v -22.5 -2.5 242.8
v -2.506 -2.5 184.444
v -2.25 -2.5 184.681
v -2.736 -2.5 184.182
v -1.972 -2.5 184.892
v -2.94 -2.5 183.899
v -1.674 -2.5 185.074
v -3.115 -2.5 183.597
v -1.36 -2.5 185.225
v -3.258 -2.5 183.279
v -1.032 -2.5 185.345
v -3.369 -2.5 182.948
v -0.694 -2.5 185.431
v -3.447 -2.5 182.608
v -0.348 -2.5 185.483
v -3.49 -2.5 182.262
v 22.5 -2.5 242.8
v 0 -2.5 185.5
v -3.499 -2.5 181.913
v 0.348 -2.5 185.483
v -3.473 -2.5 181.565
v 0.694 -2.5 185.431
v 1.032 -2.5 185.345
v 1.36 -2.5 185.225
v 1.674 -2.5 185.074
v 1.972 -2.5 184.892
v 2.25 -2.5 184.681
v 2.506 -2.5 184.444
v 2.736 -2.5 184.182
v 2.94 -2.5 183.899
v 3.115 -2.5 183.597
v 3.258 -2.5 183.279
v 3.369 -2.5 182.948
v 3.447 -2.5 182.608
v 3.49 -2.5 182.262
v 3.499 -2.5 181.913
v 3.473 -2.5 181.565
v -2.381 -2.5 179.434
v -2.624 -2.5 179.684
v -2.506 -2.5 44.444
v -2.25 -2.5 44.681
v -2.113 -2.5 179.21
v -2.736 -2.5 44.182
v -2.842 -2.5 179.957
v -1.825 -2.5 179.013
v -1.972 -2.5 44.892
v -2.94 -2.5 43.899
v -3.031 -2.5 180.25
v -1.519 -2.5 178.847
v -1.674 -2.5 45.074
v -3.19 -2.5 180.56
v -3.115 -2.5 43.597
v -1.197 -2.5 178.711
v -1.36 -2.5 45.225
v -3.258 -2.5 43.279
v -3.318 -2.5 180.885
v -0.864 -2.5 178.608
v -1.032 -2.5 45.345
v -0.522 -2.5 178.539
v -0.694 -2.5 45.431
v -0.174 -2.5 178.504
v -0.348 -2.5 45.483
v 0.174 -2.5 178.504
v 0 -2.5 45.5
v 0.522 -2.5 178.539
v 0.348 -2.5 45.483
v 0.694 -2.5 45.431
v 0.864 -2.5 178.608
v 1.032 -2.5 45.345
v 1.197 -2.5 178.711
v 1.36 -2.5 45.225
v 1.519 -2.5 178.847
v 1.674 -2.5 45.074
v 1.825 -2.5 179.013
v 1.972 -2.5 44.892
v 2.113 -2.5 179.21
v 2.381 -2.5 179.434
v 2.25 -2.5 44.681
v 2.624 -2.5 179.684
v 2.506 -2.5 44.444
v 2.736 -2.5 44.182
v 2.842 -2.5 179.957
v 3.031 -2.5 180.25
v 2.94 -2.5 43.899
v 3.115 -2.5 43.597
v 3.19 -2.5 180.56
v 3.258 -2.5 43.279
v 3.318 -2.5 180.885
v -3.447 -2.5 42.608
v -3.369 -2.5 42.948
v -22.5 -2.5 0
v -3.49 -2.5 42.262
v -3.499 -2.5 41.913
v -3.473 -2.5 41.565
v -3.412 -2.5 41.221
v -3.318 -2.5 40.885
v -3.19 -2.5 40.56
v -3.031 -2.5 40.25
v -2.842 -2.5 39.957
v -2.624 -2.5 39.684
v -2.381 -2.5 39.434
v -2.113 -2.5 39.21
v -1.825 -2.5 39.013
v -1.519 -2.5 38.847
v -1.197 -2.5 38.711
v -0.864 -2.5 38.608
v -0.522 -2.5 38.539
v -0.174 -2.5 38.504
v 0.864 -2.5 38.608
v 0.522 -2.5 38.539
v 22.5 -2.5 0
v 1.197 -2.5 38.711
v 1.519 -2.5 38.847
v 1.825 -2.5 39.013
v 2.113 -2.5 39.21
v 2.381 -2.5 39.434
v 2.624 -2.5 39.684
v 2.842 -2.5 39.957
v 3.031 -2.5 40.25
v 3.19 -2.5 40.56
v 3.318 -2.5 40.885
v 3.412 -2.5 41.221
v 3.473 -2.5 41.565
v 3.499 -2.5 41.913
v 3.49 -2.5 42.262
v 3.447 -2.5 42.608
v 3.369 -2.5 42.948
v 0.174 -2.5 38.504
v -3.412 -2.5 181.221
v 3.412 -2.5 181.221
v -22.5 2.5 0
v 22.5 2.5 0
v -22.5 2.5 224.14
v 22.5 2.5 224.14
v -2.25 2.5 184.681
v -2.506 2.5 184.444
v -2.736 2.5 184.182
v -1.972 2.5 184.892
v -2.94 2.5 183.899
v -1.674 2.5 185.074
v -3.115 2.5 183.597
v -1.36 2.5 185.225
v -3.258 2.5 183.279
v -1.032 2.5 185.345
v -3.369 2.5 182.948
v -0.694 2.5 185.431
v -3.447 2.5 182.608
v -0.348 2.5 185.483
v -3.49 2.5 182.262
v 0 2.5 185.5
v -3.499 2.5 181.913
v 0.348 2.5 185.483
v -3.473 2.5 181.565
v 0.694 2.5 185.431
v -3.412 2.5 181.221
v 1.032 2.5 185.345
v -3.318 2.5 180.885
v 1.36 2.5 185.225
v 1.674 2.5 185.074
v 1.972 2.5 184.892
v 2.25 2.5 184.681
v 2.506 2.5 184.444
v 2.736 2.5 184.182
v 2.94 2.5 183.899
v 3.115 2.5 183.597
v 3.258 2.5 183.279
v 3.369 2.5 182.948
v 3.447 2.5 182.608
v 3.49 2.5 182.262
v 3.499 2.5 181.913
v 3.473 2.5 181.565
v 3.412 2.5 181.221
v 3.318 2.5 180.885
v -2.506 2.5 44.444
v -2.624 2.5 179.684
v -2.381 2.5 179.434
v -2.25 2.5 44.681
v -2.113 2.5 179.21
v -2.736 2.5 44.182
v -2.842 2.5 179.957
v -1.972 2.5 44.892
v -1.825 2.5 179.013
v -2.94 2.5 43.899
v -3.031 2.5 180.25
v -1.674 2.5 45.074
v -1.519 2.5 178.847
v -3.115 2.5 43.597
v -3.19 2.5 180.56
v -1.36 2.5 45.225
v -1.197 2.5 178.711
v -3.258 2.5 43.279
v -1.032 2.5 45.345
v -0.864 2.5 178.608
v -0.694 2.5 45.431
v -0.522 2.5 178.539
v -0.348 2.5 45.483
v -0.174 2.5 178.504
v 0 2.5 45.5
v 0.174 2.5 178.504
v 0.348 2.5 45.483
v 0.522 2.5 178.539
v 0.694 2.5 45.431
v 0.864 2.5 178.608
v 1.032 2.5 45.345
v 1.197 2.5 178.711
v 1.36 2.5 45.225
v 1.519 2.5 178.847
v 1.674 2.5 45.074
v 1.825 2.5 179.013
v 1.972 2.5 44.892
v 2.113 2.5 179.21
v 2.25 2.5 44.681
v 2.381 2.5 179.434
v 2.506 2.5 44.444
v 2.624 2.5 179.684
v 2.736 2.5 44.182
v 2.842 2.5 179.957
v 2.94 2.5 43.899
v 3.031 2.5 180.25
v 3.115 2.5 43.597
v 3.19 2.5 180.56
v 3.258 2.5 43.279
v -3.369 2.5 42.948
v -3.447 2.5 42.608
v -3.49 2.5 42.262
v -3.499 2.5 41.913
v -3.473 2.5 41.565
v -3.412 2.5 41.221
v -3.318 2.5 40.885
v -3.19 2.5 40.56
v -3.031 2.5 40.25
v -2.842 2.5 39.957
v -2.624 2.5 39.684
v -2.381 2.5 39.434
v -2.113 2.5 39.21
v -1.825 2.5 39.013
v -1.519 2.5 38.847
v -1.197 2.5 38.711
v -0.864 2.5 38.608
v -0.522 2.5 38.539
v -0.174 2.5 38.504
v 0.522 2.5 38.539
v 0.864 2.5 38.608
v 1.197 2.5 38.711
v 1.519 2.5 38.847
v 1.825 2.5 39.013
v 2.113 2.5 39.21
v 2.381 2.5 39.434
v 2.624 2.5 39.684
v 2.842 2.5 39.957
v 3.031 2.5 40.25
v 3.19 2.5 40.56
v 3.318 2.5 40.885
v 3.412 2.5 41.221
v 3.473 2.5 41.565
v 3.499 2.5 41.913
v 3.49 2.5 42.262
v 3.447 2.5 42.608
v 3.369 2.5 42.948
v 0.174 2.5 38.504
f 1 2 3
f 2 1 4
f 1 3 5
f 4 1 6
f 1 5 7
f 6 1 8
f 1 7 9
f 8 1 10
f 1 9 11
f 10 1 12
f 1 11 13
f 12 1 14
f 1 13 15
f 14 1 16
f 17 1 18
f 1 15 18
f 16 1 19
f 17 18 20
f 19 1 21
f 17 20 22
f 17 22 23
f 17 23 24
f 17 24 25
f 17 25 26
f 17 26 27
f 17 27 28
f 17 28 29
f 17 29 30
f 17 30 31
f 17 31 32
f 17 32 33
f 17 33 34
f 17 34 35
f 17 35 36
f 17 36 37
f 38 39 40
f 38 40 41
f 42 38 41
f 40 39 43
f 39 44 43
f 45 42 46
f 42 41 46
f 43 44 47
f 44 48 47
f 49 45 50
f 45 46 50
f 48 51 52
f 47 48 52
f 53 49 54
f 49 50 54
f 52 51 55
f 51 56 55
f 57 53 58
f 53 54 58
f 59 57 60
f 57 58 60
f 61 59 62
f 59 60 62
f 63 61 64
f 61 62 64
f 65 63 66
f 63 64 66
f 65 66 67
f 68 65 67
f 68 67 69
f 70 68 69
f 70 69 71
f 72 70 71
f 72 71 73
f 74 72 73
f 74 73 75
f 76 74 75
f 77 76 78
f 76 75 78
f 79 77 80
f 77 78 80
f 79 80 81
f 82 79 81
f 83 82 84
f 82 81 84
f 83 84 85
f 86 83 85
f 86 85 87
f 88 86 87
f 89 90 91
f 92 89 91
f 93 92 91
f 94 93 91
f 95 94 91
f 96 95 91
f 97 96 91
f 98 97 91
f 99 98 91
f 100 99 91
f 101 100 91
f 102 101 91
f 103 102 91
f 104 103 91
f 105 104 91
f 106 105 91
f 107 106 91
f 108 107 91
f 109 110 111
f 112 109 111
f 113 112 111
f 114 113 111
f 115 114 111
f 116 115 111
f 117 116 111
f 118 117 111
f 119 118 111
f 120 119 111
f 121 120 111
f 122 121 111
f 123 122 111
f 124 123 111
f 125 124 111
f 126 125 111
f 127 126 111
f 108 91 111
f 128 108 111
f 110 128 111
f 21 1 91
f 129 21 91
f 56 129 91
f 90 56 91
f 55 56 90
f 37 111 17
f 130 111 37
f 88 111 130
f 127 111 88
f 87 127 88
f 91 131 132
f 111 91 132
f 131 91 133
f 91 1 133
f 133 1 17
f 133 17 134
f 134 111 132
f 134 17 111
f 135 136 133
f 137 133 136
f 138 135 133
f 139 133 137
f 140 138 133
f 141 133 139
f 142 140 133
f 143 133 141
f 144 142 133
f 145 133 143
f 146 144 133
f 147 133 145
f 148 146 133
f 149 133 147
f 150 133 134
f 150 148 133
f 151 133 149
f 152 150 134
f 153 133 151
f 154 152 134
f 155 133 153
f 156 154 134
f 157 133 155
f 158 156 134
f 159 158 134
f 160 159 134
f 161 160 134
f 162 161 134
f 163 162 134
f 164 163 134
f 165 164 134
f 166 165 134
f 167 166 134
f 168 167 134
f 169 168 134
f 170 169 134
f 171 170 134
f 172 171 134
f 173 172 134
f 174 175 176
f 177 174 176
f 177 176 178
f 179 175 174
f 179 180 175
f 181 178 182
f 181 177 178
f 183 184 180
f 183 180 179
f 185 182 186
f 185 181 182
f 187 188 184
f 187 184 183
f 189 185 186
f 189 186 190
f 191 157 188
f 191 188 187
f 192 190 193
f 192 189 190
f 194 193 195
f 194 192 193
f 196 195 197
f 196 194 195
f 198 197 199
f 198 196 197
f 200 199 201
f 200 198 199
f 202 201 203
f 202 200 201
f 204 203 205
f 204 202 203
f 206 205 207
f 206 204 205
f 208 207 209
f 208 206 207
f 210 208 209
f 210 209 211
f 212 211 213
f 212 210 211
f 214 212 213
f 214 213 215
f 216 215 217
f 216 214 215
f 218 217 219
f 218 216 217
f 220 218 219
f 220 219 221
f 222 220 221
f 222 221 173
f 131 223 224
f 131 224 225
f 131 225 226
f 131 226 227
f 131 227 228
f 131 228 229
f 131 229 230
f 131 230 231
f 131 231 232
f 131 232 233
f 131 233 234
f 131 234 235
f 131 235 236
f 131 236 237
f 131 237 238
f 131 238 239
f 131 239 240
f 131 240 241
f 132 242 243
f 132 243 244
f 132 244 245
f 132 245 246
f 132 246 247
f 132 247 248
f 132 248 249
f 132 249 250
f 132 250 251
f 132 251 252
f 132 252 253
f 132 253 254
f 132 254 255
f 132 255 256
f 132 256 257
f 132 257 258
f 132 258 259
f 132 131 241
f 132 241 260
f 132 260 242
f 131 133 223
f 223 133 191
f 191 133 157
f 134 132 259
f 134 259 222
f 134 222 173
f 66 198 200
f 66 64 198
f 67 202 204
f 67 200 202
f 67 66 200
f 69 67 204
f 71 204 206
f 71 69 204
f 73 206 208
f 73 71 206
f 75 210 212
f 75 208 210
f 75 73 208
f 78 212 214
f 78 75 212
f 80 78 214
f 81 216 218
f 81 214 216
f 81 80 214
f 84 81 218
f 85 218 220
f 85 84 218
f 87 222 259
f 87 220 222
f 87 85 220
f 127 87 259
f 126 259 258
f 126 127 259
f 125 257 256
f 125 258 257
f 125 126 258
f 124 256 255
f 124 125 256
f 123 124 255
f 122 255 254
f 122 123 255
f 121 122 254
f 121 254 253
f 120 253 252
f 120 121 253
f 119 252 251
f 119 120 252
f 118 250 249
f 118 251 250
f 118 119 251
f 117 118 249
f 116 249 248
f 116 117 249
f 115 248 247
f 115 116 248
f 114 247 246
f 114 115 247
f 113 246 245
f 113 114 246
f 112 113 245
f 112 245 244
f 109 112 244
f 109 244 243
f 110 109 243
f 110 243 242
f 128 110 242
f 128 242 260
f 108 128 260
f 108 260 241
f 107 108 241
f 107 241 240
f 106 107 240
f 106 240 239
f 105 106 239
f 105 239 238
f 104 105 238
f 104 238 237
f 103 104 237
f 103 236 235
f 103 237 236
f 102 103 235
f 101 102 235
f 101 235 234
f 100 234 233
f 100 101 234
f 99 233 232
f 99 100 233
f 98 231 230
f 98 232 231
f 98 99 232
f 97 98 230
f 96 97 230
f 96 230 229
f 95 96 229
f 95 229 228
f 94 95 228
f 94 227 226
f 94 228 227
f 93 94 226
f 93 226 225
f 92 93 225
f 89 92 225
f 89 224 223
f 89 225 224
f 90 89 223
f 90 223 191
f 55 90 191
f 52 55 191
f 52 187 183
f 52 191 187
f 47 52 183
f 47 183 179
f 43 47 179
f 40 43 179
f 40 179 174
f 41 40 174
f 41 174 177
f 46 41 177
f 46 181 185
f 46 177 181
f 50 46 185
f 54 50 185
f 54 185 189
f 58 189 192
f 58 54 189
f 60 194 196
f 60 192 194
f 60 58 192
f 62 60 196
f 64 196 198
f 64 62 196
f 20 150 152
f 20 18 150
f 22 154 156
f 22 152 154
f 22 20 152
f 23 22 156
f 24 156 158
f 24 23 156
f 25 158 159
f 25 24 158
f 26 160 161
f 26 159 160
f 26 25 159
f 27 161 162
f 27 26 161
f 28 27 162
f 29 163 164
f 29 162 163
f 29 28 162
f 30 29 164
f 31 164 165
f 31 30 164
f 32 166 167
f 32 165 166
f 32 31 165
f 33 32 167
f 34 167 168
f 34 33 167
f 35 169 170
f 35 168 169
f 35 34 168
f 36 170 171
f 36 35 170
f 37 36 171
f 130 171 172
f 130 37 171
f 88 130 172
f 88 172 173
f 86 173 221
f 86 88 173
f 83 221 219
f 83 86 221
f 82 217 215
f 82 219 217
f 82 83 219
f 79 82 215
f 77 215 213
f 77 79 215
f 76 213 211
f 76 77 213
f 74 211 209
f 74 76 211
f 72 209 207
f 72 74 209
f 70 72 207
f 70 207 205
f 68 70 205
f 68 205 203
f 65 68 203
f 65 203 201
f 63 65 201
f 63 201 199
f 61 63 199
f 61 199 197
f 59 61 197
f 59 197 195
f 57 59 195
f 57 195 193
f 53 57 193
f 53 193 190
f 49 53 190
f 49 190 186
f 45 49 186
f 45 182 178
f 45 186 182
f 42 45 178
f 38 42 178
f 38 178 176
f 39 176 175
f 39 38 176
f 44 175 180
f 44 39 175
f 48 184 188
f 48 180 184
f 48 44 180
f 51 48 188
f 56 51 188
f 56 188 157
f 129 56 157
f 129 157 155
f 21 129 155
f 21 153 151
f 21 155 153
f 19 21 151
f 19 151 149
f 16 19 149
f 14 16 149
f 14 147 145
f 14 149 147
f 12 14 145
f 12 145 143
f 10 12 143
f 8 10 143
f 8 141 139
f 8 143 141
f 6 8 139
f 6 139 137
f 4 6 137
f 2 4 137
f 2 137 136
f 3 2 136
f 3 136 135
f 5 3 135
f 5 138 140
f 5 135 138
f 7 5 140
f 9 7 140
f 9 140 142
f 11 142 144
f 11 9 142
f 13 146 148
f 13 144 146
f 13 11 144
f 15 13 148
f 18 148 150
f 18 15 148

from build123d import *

# Parameters (mm, degrees)
SKETCH_1_W               = 45
SKETCH_1_H               = 5
EXTRUDE_1_DEPTH          = 242.8
CUT_EXTRUDE_2_DEPTH      = 244.891553769
CUT_EXTRUDE_2_DEPTH_BACK = 244.891553769
SKETCH_3_R               = 3.5
CUT_EXTRUDE_3_DEPTH      = 247.947545037
CUT_EXTRUDE_3_DEPTH_BACK = 247.947545037


with BuildPart() as part:
    # Эскиз1 → Бобышка-Вытянуть1 (new body)
    with BuildSketch(Plane.XY):
        Rectangle(SKETCH_1_W, SKETCH_1_H)
    extrude(amount=EXTRUDE_1_DEPTH)

    # Эскиз3 → Вырез-Вытянуть2 (cut, two sides: drawn at the far end of the back side and taken through both)
    with BuildSketch(Plane(origin=(0, 2.5, 0), x_dir=(1, 0, 0), z_dir=(0, 1, 0)).offset(-CUT_EXTRUDE_2_DEPTH_BACK)):
        with Locations(Location((0, -42, 0), (0, 0, 270))):
            Circle(SKETCH_3_R)
        with Locations(Location((0, -182, 0), (0, 0, 270))):
            Circle(SKETCH_3_R)
        with Locations((0, -322)):
            Circle(SKETCH_3_R)
        with Locations((0, -462)):
            Circle(SKETCH_3_R)
        with Locations((0, -602)):
            Circle(SKETCH_3_R)
        with Locations((0, -742)):
            Circle(SKETCH_3_R)
        with Locations((0, -882)):
            Circle(SKETCH_3_R)
        with Locations((0, -1022)):
            Circle(SKETCH_3_R)
        with Locations((0, -1162)):
            Circle(SKETCH_3_R)
        with Locations((0, -1302)):
            Circle(SKETCH_3_R)
    extrude(amount=CUT_EXTRUDE_2_DEPTH + CUT_EXTRUDE_2_DEPTH_BACK, mode=Mode.SUBTRACT)

    # Эскиз4 → Вырез-Вытянуть3 (cut, two sides: drawn at the far end of the back side and taken through both)
    with BuildSketch(Plane.ZY.offset(22.5).offset(-CUT_EXTRUDE_3_DEPTH_BACK)):
        Polygon((242.8, -2.5), (224.139745962, 2.5), (242.8, 2.5), align=None)
    extrude(amount=CUT_EXTRUDE_3_DEPTH + CUT_EXTRUDE_3_DEPTH_BACK, mode=Mode.SUBTRACT)


solid = part.part
